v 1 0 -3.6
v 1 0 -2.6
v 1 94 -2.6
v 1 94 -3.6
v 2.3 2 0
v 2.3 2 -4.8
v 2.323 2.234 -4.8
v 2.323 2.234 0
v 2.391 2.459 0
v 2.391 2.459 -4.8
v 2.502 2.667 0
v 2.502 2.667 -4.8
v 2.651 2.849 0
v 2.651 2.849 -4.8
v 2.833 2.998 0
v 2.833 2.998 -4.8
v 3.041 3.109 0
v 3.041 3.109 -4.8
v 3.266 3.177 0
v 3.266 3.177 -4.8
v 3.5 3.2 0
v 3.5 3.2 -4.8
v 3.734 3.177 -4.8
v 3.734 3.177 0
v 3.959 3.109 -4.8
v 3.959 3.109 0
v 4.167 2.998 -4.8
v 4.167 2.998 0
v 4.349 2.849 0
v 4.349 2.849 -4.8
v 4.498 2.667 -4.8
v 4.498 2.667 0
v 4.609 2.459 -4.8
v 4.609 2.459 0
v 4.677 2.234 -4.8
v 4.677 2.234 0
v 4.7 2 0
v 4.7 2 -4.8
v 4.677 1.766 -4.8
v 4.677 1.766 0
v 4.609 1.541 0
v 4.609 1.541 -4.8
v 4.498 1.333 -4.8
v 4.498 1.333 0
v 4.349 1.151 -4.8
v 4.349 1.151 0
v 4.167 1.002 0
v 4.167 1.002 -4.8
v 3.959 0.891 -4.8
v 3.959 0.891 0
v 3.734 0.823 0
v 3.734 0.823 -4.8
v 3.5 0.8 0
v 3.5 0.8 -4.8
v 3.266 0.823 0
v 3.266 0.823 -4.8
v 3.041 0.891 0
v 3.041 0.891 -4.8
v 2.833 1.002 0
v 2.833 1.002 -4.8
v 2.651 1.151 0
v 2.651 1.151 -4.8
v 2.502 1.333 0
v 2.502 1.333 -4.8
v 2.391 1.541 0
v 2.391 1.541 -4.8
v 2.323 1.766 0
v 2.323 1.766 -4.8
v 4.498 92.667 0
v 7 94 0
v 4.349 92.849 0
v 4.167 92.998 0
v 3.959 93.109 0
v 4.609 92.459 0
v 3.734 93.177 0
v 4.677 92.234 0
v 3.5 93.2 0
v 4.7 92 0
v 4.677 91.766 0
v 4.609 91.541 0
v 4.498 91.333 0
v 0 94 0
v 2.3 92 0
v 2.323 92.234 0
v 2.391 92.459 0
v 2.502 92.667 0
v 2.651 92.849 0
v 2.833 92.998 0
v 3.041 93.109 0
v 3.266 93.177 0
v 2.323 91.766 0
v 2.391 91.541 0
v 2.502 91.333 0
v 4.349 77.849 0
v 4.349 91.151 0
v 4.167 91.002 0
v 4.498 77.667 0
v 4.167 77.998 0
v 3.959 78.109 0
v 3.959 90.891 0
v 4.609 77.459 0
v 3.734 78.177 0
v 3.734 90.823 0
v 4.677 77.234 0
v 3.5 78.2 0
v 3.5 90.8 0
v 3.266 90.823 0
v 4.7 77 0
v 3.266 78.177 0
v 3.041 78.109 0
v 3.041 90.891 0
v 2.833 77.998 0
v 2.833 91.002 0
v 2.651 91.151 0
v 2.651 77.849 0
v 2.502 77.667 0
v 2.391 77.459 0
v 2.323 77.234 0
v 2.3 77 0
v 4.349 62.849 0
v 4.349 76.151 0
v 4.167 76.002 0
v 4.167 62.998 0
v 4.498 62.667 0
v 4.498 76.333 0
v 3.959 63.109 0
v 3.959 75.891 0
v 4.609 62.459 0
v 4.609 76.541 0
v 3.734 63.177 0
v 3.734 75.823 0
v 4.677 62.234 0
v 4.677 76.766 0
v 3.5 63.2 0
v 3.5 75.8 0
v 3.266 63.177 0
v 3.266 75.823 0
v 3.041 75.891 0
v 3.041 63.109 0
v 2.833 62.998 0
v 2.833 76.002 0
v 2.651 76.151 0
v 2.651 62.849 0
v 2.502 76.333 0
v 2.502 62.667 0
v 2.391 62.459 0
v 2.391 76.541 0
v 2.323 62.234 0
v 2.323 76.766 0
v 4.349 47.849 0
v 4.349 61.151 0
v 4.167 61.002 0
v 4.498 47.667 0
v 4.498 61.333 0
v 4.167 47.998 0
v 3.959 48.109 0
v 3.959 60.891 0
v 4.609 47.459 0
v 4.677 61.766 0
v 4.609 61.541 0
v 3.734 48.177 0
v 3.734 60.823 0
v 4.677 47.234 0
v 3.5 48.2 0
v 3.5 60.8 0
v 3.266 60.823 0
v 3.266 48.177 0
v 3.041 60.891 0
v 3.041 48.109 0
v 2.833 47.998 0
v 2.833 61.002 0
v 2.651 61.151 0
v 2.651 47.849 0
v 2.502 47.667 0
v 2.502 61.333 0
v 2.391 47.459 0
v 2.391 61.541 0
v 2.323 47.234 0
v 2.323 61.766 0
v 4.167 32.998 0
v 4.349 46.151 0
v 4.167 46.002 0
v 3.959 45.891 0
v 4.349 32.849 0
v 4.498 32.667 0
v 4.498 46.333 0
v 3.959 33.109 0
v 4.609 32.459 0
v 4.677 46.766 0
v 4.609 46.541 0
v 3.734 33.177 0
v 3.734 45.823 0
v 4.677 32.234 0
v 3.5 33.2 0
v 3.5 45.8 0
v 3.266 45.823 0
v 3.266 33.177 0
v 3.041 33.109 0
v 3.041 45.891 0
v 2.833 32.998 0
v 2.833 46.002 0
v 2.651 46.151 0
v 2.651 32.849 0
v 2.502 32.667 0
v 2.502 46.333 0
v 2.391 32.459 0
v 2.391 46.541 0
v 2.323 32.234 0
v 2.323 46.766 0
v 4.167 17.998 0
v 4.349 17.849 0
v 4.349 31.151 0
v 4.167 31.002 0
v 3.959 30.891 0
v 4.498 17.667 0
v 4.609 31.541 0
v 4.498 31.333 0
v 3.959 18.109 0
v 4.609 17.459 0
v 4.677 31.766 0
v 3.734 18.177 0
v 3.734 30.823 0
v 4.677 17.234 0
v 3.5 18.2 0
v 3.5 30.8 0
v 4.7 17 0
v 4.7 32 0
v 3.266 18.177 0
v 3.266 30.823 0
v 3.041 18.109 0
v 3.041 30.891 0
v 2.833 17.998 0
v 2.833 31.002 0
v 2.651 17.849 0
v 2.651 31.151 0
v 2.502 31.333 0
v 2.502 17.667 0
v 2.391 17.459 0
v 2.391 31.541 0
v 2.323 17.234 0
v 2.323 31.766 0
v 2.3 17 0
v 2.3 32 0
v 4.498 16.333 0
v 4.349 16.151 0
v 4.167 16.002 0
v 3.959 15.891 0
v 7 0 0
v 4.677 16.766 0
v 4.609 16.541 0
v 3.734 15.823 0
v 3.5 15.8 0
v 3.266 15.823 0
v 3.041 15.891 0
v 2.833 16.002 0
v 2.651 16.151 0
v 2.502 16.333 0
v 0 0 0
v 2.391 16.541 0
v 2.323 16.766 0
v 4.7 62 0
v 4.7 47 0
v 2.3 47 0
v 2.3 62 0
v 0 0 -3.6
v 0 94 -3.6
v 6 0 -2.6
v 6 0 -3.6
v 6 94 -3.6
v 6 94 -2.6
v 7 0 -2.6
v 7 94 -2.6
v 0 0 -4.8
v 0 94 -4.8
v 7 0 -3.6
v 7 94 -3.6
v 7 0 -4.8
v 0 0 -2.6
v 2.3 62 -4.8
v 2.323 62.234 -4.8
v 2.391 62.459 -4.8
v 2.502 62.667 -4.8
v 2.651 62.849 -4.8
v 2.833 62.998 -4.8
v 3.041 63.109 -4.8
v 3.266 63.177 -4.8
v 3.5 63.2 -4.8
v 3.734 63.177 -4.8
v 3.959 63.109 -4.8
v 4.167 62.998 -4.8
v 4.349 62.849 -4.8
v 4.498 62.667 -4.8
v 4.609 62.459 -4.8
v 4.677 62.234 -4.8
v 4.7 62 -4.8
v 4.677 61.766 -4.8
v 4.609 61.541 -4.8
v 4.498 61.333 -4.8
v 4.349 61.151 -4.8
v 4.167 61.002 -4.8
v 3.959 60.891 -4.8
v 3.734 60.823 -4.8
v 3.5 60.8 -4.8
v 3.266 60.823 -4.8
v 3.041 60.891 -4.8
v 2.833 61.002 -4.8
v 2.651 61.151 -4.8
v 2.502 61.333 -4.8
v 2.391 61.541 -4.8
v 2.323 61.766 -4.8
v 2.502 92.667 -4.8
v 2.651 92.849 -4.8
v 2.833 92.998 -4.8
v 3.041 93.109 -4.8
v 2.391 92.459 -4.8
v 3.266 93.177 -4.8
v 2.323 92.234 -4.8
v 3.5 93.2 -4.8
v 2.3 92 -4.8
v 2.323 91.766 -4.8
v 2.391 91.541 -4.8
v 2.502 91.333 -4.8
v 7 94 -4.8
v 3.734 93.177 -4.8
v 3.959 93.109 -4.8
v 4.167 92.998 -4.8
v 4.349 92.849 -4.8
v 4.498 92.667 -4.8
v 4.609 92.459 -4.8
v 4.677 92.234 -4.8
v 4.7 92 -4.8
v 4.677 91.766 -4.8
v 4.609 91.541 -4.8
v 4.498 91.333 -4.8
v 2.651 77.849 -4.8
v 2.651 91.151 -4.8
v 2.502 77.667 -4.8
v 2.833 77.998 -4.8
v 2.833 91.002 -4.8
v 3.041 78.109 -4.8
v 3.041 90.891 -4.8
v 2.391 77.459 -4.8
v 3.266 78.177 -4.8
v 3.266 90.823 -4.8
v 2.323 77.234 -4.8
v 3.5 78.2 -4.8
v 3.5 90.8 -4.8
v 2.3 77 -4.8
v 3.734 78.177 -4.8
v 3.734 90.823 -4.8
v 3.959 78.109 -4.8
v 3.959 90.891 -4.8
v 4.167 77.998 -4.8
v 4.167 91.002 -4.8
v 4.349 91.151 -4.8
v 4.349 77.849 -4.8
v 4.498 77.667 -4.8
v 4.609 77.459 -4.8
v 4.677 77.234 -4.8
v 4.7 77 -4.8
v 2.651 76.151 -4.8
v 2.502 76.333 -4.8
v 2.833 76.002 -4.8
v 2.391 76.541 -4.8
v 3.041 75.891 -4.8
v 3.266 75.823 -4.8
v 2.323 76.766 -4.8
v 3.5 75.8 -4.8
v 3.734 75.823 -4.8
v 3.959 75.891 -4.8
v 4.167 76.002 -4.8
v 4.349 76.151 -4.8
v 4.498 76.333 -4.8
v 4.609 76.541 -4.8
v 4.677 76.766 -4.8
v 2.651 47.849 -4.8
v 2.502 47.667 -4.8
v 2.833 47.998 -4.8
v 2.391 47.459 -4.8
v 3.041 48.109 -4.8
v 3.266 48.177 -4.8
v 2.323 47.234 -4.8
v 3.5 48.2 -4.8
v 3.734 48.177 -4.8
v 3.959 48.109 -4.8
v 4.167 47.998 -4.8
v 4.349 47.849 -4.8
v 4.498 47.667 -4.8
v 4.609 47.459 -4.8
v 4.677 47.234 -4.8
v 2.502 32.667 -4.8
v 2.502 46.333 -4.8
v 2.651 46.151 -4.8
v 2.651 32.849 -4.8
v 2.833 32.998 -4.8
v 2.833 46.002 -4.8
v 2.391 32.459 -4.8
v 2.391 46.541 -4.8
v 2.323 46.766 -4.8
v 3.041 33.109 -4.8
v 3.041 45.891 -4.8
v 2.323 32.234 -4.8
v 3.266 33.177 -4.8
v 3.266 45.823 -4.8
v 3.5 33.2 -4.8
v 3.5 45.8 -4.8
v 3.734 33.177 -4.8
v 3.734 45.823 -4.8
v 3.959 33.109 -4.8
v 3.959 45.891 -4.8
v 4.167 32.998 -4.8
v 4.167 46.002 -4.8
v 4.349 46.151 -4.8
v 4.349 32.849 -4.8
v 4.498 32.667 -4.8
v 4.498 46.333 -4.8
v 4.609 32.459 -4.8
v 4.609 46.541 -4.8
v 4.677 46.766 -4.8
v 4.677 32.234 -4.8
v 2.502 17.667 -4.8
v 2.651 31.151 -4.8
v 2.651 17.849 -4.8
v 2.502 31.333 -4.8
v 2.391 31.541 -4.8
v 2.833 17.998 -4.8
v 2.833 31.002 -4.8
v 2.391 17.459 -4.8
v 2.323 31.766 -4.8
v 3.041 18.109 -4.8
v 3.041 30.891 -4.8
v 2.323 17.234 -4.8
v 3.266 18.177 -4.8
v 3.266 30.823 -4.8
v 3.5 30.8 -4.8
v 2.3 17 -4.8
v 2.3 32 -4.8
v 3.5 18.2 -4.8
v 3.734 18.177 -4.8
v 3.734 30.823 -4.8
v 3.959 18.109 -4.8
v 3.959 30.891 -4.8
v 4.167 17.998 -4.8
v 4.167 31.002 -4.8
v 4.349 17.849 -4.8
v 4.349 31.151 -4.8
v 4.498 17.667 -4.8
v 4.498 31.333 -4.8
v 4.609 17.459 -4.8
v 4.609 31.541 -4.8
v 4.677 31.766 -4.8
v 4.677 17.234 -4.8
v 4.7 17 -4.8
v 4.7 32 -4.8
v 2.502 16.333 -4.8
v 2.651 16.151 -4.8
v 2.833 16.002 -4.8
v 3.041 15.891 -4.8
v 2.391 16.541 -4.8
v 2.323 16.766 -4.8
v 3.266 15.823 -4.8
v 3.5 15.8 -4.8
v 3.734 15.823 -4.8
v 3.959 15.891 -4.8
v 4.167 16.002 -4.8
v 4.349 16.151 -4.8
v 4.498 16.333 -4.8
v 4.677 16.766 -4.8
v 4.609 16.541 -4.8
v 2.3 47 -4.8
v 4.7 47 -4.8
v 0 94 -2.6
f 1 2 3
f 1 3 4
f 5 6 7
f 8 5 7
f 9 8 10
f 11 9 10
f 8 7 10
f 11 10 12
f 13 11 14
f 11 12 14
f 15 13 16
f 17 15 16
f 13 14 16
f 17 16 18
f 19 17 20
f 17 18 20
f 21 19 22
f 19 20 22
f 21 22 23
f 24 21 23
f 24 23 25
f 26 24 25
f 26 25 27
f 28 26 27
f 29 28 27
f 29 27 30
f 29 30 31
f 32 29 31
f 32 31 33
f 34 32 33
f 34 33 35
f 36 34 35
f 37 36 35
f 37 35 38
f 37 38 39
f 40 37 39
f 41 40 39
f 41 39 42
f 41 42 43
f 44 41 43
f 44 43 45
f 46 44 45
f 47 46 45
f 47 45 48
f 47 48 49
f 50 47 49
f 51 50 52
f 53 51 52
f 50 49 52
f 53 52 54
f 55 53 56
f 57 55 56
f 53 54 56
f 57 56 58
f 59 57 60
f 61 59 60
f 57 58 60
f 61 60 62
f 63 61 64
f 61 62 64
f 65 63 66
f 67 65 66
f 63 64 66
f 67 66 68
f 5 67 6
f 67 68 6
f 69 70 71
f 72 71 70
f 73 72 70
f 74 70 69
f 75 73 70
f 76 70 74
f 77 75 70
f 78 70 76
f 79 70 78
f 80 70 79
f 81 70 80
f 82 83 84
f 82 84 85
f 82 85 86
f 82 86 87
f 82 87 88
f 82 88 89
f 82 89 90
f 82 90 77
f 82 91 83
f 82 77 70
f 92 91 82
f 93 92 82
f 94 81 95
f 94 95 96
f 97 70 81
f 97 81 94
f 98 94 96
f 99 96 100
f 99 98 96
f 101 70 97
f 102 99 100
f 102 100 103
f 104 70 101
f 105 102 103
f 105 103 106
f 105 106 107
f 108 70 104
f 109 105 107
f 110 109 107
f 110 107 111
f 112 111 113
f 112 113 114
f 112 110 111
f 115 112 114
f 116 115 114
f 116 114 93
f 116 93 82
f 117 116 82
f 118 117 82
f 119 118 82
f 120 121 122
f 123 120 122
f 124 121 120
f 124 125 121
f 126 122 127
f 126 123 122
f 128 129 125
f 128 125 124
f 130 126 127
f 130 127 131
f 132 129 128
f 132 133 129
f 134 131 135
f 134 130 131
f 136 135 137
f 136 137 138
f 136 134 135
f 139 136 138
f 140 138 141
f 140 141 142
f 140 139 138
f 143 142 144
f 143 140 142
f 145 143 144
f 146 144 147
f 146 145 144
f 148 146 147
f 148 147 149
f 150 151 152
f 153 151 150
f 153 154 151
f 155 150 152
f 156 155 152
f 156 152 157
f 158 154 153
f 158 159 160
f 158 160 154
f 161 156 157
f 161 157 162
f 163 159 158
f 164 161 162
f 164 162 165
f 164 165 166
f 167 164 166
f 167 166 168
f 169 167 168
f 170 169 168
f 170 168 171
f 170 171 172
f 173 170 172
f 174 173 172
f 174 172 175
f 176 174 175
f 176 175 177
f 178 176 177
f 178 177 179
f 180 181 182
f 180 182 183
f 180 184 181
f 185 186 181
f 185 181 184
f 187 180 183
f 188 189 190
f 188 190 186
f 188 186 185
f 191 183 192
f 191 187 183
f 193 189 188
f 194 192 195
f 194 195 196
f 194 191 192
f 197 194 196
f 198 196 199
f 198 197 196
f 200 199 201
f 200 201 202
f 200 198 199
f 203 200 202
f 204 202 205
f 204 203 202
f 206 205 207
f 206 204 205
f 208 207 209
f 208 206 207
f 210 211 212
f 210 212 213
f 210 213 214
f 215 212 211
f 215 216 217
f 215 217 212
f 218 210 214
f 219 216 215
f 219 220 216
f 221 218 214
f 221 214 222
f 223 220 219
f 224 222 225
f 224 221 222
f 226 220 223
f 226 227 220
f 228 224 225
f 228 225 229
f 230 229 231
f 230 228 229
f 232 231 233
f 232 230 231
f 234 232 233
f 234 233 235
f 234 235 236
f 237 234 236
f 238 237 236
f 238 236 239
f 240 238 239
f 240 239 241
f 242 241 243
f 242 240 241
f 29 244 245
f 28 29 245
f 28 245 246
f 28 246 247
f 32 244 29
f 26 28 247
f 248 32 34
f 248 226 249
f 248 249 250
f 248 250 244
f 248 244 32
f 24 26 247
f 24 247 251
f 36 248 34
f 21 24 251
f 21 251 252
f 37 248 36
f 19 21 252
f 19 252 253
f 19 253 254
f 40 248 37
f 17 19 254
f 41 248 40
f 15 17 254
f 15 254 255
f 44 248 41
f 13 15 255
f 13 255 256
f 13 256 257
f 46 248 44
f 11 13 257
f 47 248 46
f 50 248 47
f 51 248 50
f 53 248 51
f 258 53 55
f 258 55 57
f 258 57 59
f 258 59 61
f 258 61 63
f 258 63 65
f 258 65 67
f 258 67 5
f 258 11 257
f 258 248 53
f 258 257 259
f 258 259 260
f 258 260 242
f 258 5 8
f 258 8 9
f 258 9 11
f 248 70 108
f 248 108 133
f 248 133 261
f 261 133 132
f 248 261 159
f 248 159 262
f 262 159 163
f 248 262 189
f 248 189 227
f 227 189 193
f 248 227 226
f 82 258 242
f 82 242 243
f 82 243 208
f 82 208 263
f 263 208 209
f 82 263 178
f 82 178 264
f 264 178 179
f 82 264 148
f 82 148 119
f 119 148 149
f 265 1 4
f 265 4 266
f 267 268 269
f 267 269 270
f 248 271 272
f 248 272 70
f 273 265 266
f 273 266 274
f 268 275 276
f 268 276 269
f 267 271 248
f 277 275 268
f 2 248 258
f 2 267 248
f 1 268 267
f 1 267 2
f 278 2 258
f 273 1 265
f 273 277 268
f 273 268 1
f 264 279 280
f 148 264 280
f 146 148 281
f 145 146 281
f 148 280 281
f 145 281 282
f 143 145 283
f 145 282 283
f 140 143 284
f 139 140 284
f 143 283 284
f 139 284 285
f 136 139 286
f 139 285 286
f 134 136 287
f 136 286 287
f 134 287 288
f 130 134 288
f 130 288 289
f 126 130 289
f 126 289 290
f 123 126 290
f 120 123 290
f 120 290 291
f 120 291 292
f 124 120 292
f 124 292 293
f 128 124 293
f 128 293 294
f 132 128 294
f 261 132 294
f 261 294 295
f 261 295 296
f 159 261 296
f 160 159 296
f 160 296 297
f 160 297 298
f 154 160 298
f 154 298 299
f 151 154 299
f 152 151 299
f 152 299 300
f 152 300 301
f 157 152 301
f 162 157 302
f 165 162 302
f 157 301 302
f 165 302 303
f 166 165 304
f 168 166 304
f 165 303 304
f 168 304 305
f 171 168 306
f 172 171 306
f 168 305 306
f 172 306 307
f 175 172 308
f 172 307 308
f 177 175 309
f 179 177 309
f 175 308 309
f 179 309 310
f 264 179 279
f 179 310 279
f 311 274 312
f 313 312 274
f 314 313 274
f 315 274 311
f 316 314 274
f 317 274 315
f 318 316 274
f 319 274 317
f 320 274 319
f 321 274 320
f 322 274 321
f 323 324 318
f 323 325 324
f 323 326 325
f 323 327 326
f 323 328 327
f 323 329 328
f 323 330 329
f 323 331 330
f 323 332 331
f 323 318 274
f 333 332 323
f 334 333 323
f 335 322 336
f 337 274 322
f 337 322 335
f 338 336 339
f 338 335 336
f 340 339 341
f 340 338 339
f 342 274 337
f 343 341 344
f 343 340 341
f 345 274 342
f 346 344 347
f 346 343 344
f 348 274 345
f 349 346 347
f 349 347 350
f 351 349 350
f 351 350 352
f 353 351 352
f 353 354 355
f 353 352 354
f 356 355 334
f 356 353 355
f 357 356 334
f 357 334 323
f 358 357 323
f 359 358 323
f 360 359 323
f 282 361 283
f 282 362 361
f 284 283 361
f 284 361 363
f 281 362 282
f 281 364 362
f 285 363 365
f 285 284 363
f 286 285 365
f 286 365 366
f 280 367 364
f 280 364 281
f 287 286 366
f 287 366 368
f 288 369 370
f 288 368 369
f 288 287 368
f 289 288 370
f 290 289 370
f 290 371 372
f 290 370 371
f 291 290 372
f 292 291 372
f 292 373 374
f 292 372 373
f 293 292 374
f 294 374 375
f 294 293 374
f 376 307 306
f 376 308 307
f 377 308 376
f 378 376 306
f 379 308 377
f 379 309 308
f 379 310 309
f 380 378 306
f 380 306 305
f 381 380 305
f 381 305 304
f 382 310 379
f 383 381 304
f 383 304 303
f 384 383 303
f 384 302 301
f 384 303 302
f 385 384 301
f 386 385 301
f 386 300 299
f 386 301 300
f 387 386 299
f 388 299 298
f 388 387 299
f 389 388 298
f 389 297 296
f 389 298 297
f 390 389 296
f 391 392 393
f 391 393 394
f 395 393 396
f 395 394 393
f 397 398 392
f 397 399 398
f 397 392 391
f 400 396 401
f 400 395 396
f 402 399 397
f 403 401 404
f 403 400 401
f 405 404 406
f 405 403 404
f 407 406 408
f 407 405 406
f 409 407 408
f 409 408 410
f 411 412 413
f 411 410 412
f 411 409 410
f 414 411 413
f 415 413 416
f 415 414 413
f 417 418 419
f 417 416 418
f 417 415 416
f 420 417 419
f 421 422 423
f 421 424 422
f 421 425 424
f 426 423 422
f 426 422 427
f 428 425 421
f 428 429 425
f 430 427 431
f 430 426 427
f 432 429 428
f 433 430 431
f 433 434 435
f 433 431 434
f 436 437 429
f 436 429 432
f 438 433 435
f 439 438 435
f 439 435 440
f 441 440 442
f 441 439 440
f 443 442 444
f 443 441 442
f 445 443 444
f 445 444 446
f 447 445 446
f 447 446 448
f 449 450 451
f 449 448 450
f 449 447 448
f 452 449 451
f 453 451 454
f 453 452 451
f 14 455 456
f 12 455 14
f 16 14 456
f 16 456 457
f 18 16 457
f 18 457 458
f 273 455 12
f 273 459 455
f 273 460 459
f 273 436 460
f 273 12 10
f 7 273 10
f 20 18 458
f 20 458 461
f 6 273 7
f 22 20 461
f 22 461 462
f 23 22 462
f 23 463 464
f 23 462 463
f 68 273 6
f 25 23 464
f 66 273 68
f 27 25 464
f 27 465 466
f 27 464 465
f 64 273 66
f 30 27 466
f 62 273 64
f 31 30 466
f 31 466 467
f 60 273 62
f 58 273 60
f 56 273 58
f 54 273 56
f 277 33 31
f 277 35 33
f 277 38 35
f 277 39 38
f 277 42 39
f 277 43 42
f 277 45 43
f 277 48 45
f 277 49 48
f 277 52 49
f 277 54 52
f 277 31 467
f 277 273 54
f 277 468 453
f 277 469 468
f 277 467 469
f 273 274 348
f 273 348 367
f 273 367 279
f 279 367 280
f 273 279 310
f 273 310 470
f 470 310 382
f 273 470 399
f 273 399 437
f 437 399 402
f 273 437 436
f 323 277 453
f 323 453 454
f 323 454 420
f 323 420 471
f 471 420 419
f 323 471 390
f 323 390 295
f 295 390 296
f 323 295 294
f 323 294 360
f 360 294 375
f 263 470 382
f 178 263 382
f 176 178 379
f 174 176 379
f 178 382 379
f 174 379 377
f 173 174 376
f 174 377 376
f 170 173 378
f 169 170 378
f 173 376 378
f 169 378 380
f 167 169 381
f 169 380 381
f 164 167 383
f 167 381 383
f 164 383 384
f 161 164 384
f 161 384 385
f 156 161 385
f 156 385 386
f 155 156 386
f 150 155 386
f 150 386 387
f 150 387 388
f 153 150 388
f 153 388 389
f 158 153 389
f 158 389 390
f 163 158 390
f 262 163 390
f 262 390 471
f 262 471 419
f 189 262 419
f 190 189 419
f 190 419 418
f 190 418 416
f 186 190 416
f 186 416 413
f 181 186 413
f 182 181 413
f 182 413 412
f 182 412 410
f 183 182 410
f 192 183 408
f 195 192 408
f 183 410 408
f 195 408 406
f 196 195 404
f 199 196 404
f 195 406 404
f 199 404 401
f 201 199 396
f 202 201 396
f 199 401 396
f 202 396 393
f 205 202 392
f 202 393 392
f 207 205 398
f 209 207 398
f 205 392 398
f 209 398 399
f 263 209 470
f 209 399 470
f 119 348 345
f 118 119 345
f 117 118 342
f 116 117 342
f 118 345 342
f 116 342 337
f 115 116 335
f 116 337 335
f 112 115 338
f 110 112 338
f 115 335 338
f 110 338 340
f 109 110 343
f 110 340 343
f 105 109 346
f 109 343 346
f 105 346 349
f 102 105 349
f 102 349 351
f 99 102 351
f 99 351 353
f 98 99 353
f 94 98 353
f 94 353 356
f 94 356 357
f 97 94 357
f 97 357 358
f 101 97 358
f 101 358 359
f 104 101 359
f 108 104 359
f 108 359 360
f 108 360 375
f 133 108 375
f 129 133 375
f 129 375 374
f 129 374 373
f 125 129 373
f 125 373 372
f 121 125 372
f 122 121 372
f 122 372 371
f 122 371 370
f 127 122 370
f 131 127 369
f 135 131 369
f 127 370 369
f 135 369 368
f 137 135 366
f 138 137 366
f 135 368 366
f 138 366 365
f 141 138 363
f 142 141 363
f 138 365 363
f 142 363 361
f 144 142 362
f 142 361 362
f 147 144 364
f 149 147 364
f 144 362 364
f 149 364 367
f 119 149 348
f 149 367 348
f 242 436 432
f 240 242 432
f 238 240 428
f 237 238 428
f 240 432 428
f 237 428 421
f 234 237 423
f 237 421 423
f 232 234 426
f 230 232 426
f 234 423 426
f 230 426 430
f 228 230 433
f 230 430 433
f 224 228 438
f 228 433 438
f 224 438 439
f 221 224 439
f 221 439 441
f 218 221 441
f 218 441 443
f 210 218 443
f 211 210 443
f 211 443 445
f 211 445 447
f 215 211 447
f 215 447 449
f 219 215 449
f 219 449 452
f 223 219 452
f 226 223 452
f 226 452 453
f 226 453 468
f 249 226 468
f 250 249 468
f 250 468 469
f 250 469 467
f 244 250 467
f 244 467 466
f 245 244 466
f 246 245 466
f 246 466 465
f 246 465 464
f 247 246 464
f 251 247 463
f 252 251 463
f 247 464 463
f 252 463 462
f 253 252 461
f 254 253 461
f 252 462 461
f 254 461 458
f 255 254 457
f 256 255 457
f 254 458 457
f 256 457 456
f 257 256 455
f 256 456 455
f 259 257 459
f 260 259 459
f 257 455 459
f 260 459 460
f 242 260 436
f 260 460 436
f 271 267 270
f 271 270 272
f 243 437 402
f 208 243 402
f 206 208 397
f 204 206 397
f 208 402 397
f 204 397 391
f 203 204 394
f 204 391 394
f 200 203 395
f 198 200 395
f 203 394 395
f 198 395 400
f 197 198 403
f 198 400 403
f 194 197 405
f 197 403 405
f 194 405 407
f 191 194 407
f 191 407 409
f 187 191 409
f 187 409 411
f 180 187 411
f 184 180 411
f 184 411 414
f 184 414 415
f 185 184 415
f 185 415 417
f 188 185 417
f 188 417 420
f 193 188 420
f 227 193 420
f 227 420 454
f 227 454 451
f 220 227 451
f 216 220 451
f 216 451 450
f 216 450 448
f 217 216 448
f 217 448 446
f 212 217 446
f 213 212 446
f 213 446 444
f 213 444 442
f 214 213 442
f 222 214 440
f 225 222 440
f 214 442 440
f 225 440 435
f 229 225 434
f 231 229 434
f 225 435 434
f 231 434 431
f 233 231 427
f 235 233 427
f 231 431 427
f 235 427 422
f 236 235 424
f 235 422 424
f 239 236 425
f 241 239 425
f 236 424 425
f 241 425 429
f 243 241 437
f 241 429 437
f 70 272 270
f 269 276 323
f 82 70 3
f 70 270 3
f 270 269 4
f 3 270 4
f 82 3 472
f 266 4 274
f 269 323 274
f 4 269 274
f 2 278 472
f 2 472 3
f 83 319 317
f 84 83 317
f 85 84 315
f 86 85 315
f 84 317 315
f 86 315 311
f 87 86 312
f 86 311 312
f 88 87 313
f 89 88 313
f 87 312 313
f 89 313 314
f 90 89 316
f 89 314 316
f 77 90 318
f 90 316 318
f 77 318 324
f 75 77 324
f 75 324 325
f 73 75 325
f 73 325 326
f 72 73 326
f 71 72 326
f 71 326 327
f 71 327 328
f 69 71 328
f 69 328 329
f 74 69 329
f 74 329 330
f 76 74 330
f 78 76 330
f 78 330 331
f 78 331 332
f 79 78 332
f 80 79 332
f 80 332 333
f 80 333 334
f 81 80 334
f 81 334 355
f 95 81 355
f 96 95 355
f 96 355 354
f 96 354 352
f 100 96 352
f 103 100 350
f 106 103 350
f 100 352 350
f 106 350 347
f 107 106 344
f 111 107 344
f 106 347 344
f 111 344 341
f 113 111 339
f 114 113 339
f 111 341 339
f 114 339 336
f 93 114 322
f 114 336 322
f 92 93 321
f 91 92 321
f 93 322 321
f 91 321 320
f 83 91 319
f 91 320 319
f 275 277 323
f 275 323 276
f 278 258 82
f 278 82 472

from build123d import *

# Parameters (mm, degrees)
EXTRUDE_1_DEPTH     = 94
SKETCH_2_R          = 1.2
CUT_EXTRUDE_1_DEPTH = 95.382413616


with BuildPart() as part:
    # 草图1 → 凸台-拉伸1 (new body)
    with BuildSketch(Plane(origin=(0, 0, 0), x_dir=(1, 0, 0), z_dir=(0, 1, 0))):
        Polygon((0, 0), (0, 2.6), (1, 2.6), (1, 3.6), (0, 3.6), (0, 4.8), (7, 4.8), (7, 3.6), (6, 3.6), (6, 2.6), (7, 2.6), (7, 0), align=None)
    extrude(amount=EXTRUDE_1_DEPTH)

    # 草图2 → 切除-拉伸1 (cut, through all)
    with BuildSketch(Plane(origin=(0, 0, -4.8), x_dir=(-1, 0, 0), z_dir=(0, 0, -1))):
        with Locations((-3.5, 62)):
            Circle(SKETCH_2_R)
        with Locations((-3.5, 77)):
            Circle(SKETCH_2_R)
        with Locations((-3.5, 47)):
            Circle(SKETCH_2_R)
        with Locations((-3.5, 32)):
            Circle(SKETCH_2_R)
        with Locations((-3.5, 17)):
            Circle(SKETCH_2_R)
        with Locations((-3.5, 92)):
            Circle(SKETCH_2_R)
        with Locations((-3.5, 2)):
            Circle(SKETCH_2_R)
    extrude(amount=-CUT_EXTRUDE_1_DEPTH, mode=Mode.SUBTRACT)


solid = part.part
